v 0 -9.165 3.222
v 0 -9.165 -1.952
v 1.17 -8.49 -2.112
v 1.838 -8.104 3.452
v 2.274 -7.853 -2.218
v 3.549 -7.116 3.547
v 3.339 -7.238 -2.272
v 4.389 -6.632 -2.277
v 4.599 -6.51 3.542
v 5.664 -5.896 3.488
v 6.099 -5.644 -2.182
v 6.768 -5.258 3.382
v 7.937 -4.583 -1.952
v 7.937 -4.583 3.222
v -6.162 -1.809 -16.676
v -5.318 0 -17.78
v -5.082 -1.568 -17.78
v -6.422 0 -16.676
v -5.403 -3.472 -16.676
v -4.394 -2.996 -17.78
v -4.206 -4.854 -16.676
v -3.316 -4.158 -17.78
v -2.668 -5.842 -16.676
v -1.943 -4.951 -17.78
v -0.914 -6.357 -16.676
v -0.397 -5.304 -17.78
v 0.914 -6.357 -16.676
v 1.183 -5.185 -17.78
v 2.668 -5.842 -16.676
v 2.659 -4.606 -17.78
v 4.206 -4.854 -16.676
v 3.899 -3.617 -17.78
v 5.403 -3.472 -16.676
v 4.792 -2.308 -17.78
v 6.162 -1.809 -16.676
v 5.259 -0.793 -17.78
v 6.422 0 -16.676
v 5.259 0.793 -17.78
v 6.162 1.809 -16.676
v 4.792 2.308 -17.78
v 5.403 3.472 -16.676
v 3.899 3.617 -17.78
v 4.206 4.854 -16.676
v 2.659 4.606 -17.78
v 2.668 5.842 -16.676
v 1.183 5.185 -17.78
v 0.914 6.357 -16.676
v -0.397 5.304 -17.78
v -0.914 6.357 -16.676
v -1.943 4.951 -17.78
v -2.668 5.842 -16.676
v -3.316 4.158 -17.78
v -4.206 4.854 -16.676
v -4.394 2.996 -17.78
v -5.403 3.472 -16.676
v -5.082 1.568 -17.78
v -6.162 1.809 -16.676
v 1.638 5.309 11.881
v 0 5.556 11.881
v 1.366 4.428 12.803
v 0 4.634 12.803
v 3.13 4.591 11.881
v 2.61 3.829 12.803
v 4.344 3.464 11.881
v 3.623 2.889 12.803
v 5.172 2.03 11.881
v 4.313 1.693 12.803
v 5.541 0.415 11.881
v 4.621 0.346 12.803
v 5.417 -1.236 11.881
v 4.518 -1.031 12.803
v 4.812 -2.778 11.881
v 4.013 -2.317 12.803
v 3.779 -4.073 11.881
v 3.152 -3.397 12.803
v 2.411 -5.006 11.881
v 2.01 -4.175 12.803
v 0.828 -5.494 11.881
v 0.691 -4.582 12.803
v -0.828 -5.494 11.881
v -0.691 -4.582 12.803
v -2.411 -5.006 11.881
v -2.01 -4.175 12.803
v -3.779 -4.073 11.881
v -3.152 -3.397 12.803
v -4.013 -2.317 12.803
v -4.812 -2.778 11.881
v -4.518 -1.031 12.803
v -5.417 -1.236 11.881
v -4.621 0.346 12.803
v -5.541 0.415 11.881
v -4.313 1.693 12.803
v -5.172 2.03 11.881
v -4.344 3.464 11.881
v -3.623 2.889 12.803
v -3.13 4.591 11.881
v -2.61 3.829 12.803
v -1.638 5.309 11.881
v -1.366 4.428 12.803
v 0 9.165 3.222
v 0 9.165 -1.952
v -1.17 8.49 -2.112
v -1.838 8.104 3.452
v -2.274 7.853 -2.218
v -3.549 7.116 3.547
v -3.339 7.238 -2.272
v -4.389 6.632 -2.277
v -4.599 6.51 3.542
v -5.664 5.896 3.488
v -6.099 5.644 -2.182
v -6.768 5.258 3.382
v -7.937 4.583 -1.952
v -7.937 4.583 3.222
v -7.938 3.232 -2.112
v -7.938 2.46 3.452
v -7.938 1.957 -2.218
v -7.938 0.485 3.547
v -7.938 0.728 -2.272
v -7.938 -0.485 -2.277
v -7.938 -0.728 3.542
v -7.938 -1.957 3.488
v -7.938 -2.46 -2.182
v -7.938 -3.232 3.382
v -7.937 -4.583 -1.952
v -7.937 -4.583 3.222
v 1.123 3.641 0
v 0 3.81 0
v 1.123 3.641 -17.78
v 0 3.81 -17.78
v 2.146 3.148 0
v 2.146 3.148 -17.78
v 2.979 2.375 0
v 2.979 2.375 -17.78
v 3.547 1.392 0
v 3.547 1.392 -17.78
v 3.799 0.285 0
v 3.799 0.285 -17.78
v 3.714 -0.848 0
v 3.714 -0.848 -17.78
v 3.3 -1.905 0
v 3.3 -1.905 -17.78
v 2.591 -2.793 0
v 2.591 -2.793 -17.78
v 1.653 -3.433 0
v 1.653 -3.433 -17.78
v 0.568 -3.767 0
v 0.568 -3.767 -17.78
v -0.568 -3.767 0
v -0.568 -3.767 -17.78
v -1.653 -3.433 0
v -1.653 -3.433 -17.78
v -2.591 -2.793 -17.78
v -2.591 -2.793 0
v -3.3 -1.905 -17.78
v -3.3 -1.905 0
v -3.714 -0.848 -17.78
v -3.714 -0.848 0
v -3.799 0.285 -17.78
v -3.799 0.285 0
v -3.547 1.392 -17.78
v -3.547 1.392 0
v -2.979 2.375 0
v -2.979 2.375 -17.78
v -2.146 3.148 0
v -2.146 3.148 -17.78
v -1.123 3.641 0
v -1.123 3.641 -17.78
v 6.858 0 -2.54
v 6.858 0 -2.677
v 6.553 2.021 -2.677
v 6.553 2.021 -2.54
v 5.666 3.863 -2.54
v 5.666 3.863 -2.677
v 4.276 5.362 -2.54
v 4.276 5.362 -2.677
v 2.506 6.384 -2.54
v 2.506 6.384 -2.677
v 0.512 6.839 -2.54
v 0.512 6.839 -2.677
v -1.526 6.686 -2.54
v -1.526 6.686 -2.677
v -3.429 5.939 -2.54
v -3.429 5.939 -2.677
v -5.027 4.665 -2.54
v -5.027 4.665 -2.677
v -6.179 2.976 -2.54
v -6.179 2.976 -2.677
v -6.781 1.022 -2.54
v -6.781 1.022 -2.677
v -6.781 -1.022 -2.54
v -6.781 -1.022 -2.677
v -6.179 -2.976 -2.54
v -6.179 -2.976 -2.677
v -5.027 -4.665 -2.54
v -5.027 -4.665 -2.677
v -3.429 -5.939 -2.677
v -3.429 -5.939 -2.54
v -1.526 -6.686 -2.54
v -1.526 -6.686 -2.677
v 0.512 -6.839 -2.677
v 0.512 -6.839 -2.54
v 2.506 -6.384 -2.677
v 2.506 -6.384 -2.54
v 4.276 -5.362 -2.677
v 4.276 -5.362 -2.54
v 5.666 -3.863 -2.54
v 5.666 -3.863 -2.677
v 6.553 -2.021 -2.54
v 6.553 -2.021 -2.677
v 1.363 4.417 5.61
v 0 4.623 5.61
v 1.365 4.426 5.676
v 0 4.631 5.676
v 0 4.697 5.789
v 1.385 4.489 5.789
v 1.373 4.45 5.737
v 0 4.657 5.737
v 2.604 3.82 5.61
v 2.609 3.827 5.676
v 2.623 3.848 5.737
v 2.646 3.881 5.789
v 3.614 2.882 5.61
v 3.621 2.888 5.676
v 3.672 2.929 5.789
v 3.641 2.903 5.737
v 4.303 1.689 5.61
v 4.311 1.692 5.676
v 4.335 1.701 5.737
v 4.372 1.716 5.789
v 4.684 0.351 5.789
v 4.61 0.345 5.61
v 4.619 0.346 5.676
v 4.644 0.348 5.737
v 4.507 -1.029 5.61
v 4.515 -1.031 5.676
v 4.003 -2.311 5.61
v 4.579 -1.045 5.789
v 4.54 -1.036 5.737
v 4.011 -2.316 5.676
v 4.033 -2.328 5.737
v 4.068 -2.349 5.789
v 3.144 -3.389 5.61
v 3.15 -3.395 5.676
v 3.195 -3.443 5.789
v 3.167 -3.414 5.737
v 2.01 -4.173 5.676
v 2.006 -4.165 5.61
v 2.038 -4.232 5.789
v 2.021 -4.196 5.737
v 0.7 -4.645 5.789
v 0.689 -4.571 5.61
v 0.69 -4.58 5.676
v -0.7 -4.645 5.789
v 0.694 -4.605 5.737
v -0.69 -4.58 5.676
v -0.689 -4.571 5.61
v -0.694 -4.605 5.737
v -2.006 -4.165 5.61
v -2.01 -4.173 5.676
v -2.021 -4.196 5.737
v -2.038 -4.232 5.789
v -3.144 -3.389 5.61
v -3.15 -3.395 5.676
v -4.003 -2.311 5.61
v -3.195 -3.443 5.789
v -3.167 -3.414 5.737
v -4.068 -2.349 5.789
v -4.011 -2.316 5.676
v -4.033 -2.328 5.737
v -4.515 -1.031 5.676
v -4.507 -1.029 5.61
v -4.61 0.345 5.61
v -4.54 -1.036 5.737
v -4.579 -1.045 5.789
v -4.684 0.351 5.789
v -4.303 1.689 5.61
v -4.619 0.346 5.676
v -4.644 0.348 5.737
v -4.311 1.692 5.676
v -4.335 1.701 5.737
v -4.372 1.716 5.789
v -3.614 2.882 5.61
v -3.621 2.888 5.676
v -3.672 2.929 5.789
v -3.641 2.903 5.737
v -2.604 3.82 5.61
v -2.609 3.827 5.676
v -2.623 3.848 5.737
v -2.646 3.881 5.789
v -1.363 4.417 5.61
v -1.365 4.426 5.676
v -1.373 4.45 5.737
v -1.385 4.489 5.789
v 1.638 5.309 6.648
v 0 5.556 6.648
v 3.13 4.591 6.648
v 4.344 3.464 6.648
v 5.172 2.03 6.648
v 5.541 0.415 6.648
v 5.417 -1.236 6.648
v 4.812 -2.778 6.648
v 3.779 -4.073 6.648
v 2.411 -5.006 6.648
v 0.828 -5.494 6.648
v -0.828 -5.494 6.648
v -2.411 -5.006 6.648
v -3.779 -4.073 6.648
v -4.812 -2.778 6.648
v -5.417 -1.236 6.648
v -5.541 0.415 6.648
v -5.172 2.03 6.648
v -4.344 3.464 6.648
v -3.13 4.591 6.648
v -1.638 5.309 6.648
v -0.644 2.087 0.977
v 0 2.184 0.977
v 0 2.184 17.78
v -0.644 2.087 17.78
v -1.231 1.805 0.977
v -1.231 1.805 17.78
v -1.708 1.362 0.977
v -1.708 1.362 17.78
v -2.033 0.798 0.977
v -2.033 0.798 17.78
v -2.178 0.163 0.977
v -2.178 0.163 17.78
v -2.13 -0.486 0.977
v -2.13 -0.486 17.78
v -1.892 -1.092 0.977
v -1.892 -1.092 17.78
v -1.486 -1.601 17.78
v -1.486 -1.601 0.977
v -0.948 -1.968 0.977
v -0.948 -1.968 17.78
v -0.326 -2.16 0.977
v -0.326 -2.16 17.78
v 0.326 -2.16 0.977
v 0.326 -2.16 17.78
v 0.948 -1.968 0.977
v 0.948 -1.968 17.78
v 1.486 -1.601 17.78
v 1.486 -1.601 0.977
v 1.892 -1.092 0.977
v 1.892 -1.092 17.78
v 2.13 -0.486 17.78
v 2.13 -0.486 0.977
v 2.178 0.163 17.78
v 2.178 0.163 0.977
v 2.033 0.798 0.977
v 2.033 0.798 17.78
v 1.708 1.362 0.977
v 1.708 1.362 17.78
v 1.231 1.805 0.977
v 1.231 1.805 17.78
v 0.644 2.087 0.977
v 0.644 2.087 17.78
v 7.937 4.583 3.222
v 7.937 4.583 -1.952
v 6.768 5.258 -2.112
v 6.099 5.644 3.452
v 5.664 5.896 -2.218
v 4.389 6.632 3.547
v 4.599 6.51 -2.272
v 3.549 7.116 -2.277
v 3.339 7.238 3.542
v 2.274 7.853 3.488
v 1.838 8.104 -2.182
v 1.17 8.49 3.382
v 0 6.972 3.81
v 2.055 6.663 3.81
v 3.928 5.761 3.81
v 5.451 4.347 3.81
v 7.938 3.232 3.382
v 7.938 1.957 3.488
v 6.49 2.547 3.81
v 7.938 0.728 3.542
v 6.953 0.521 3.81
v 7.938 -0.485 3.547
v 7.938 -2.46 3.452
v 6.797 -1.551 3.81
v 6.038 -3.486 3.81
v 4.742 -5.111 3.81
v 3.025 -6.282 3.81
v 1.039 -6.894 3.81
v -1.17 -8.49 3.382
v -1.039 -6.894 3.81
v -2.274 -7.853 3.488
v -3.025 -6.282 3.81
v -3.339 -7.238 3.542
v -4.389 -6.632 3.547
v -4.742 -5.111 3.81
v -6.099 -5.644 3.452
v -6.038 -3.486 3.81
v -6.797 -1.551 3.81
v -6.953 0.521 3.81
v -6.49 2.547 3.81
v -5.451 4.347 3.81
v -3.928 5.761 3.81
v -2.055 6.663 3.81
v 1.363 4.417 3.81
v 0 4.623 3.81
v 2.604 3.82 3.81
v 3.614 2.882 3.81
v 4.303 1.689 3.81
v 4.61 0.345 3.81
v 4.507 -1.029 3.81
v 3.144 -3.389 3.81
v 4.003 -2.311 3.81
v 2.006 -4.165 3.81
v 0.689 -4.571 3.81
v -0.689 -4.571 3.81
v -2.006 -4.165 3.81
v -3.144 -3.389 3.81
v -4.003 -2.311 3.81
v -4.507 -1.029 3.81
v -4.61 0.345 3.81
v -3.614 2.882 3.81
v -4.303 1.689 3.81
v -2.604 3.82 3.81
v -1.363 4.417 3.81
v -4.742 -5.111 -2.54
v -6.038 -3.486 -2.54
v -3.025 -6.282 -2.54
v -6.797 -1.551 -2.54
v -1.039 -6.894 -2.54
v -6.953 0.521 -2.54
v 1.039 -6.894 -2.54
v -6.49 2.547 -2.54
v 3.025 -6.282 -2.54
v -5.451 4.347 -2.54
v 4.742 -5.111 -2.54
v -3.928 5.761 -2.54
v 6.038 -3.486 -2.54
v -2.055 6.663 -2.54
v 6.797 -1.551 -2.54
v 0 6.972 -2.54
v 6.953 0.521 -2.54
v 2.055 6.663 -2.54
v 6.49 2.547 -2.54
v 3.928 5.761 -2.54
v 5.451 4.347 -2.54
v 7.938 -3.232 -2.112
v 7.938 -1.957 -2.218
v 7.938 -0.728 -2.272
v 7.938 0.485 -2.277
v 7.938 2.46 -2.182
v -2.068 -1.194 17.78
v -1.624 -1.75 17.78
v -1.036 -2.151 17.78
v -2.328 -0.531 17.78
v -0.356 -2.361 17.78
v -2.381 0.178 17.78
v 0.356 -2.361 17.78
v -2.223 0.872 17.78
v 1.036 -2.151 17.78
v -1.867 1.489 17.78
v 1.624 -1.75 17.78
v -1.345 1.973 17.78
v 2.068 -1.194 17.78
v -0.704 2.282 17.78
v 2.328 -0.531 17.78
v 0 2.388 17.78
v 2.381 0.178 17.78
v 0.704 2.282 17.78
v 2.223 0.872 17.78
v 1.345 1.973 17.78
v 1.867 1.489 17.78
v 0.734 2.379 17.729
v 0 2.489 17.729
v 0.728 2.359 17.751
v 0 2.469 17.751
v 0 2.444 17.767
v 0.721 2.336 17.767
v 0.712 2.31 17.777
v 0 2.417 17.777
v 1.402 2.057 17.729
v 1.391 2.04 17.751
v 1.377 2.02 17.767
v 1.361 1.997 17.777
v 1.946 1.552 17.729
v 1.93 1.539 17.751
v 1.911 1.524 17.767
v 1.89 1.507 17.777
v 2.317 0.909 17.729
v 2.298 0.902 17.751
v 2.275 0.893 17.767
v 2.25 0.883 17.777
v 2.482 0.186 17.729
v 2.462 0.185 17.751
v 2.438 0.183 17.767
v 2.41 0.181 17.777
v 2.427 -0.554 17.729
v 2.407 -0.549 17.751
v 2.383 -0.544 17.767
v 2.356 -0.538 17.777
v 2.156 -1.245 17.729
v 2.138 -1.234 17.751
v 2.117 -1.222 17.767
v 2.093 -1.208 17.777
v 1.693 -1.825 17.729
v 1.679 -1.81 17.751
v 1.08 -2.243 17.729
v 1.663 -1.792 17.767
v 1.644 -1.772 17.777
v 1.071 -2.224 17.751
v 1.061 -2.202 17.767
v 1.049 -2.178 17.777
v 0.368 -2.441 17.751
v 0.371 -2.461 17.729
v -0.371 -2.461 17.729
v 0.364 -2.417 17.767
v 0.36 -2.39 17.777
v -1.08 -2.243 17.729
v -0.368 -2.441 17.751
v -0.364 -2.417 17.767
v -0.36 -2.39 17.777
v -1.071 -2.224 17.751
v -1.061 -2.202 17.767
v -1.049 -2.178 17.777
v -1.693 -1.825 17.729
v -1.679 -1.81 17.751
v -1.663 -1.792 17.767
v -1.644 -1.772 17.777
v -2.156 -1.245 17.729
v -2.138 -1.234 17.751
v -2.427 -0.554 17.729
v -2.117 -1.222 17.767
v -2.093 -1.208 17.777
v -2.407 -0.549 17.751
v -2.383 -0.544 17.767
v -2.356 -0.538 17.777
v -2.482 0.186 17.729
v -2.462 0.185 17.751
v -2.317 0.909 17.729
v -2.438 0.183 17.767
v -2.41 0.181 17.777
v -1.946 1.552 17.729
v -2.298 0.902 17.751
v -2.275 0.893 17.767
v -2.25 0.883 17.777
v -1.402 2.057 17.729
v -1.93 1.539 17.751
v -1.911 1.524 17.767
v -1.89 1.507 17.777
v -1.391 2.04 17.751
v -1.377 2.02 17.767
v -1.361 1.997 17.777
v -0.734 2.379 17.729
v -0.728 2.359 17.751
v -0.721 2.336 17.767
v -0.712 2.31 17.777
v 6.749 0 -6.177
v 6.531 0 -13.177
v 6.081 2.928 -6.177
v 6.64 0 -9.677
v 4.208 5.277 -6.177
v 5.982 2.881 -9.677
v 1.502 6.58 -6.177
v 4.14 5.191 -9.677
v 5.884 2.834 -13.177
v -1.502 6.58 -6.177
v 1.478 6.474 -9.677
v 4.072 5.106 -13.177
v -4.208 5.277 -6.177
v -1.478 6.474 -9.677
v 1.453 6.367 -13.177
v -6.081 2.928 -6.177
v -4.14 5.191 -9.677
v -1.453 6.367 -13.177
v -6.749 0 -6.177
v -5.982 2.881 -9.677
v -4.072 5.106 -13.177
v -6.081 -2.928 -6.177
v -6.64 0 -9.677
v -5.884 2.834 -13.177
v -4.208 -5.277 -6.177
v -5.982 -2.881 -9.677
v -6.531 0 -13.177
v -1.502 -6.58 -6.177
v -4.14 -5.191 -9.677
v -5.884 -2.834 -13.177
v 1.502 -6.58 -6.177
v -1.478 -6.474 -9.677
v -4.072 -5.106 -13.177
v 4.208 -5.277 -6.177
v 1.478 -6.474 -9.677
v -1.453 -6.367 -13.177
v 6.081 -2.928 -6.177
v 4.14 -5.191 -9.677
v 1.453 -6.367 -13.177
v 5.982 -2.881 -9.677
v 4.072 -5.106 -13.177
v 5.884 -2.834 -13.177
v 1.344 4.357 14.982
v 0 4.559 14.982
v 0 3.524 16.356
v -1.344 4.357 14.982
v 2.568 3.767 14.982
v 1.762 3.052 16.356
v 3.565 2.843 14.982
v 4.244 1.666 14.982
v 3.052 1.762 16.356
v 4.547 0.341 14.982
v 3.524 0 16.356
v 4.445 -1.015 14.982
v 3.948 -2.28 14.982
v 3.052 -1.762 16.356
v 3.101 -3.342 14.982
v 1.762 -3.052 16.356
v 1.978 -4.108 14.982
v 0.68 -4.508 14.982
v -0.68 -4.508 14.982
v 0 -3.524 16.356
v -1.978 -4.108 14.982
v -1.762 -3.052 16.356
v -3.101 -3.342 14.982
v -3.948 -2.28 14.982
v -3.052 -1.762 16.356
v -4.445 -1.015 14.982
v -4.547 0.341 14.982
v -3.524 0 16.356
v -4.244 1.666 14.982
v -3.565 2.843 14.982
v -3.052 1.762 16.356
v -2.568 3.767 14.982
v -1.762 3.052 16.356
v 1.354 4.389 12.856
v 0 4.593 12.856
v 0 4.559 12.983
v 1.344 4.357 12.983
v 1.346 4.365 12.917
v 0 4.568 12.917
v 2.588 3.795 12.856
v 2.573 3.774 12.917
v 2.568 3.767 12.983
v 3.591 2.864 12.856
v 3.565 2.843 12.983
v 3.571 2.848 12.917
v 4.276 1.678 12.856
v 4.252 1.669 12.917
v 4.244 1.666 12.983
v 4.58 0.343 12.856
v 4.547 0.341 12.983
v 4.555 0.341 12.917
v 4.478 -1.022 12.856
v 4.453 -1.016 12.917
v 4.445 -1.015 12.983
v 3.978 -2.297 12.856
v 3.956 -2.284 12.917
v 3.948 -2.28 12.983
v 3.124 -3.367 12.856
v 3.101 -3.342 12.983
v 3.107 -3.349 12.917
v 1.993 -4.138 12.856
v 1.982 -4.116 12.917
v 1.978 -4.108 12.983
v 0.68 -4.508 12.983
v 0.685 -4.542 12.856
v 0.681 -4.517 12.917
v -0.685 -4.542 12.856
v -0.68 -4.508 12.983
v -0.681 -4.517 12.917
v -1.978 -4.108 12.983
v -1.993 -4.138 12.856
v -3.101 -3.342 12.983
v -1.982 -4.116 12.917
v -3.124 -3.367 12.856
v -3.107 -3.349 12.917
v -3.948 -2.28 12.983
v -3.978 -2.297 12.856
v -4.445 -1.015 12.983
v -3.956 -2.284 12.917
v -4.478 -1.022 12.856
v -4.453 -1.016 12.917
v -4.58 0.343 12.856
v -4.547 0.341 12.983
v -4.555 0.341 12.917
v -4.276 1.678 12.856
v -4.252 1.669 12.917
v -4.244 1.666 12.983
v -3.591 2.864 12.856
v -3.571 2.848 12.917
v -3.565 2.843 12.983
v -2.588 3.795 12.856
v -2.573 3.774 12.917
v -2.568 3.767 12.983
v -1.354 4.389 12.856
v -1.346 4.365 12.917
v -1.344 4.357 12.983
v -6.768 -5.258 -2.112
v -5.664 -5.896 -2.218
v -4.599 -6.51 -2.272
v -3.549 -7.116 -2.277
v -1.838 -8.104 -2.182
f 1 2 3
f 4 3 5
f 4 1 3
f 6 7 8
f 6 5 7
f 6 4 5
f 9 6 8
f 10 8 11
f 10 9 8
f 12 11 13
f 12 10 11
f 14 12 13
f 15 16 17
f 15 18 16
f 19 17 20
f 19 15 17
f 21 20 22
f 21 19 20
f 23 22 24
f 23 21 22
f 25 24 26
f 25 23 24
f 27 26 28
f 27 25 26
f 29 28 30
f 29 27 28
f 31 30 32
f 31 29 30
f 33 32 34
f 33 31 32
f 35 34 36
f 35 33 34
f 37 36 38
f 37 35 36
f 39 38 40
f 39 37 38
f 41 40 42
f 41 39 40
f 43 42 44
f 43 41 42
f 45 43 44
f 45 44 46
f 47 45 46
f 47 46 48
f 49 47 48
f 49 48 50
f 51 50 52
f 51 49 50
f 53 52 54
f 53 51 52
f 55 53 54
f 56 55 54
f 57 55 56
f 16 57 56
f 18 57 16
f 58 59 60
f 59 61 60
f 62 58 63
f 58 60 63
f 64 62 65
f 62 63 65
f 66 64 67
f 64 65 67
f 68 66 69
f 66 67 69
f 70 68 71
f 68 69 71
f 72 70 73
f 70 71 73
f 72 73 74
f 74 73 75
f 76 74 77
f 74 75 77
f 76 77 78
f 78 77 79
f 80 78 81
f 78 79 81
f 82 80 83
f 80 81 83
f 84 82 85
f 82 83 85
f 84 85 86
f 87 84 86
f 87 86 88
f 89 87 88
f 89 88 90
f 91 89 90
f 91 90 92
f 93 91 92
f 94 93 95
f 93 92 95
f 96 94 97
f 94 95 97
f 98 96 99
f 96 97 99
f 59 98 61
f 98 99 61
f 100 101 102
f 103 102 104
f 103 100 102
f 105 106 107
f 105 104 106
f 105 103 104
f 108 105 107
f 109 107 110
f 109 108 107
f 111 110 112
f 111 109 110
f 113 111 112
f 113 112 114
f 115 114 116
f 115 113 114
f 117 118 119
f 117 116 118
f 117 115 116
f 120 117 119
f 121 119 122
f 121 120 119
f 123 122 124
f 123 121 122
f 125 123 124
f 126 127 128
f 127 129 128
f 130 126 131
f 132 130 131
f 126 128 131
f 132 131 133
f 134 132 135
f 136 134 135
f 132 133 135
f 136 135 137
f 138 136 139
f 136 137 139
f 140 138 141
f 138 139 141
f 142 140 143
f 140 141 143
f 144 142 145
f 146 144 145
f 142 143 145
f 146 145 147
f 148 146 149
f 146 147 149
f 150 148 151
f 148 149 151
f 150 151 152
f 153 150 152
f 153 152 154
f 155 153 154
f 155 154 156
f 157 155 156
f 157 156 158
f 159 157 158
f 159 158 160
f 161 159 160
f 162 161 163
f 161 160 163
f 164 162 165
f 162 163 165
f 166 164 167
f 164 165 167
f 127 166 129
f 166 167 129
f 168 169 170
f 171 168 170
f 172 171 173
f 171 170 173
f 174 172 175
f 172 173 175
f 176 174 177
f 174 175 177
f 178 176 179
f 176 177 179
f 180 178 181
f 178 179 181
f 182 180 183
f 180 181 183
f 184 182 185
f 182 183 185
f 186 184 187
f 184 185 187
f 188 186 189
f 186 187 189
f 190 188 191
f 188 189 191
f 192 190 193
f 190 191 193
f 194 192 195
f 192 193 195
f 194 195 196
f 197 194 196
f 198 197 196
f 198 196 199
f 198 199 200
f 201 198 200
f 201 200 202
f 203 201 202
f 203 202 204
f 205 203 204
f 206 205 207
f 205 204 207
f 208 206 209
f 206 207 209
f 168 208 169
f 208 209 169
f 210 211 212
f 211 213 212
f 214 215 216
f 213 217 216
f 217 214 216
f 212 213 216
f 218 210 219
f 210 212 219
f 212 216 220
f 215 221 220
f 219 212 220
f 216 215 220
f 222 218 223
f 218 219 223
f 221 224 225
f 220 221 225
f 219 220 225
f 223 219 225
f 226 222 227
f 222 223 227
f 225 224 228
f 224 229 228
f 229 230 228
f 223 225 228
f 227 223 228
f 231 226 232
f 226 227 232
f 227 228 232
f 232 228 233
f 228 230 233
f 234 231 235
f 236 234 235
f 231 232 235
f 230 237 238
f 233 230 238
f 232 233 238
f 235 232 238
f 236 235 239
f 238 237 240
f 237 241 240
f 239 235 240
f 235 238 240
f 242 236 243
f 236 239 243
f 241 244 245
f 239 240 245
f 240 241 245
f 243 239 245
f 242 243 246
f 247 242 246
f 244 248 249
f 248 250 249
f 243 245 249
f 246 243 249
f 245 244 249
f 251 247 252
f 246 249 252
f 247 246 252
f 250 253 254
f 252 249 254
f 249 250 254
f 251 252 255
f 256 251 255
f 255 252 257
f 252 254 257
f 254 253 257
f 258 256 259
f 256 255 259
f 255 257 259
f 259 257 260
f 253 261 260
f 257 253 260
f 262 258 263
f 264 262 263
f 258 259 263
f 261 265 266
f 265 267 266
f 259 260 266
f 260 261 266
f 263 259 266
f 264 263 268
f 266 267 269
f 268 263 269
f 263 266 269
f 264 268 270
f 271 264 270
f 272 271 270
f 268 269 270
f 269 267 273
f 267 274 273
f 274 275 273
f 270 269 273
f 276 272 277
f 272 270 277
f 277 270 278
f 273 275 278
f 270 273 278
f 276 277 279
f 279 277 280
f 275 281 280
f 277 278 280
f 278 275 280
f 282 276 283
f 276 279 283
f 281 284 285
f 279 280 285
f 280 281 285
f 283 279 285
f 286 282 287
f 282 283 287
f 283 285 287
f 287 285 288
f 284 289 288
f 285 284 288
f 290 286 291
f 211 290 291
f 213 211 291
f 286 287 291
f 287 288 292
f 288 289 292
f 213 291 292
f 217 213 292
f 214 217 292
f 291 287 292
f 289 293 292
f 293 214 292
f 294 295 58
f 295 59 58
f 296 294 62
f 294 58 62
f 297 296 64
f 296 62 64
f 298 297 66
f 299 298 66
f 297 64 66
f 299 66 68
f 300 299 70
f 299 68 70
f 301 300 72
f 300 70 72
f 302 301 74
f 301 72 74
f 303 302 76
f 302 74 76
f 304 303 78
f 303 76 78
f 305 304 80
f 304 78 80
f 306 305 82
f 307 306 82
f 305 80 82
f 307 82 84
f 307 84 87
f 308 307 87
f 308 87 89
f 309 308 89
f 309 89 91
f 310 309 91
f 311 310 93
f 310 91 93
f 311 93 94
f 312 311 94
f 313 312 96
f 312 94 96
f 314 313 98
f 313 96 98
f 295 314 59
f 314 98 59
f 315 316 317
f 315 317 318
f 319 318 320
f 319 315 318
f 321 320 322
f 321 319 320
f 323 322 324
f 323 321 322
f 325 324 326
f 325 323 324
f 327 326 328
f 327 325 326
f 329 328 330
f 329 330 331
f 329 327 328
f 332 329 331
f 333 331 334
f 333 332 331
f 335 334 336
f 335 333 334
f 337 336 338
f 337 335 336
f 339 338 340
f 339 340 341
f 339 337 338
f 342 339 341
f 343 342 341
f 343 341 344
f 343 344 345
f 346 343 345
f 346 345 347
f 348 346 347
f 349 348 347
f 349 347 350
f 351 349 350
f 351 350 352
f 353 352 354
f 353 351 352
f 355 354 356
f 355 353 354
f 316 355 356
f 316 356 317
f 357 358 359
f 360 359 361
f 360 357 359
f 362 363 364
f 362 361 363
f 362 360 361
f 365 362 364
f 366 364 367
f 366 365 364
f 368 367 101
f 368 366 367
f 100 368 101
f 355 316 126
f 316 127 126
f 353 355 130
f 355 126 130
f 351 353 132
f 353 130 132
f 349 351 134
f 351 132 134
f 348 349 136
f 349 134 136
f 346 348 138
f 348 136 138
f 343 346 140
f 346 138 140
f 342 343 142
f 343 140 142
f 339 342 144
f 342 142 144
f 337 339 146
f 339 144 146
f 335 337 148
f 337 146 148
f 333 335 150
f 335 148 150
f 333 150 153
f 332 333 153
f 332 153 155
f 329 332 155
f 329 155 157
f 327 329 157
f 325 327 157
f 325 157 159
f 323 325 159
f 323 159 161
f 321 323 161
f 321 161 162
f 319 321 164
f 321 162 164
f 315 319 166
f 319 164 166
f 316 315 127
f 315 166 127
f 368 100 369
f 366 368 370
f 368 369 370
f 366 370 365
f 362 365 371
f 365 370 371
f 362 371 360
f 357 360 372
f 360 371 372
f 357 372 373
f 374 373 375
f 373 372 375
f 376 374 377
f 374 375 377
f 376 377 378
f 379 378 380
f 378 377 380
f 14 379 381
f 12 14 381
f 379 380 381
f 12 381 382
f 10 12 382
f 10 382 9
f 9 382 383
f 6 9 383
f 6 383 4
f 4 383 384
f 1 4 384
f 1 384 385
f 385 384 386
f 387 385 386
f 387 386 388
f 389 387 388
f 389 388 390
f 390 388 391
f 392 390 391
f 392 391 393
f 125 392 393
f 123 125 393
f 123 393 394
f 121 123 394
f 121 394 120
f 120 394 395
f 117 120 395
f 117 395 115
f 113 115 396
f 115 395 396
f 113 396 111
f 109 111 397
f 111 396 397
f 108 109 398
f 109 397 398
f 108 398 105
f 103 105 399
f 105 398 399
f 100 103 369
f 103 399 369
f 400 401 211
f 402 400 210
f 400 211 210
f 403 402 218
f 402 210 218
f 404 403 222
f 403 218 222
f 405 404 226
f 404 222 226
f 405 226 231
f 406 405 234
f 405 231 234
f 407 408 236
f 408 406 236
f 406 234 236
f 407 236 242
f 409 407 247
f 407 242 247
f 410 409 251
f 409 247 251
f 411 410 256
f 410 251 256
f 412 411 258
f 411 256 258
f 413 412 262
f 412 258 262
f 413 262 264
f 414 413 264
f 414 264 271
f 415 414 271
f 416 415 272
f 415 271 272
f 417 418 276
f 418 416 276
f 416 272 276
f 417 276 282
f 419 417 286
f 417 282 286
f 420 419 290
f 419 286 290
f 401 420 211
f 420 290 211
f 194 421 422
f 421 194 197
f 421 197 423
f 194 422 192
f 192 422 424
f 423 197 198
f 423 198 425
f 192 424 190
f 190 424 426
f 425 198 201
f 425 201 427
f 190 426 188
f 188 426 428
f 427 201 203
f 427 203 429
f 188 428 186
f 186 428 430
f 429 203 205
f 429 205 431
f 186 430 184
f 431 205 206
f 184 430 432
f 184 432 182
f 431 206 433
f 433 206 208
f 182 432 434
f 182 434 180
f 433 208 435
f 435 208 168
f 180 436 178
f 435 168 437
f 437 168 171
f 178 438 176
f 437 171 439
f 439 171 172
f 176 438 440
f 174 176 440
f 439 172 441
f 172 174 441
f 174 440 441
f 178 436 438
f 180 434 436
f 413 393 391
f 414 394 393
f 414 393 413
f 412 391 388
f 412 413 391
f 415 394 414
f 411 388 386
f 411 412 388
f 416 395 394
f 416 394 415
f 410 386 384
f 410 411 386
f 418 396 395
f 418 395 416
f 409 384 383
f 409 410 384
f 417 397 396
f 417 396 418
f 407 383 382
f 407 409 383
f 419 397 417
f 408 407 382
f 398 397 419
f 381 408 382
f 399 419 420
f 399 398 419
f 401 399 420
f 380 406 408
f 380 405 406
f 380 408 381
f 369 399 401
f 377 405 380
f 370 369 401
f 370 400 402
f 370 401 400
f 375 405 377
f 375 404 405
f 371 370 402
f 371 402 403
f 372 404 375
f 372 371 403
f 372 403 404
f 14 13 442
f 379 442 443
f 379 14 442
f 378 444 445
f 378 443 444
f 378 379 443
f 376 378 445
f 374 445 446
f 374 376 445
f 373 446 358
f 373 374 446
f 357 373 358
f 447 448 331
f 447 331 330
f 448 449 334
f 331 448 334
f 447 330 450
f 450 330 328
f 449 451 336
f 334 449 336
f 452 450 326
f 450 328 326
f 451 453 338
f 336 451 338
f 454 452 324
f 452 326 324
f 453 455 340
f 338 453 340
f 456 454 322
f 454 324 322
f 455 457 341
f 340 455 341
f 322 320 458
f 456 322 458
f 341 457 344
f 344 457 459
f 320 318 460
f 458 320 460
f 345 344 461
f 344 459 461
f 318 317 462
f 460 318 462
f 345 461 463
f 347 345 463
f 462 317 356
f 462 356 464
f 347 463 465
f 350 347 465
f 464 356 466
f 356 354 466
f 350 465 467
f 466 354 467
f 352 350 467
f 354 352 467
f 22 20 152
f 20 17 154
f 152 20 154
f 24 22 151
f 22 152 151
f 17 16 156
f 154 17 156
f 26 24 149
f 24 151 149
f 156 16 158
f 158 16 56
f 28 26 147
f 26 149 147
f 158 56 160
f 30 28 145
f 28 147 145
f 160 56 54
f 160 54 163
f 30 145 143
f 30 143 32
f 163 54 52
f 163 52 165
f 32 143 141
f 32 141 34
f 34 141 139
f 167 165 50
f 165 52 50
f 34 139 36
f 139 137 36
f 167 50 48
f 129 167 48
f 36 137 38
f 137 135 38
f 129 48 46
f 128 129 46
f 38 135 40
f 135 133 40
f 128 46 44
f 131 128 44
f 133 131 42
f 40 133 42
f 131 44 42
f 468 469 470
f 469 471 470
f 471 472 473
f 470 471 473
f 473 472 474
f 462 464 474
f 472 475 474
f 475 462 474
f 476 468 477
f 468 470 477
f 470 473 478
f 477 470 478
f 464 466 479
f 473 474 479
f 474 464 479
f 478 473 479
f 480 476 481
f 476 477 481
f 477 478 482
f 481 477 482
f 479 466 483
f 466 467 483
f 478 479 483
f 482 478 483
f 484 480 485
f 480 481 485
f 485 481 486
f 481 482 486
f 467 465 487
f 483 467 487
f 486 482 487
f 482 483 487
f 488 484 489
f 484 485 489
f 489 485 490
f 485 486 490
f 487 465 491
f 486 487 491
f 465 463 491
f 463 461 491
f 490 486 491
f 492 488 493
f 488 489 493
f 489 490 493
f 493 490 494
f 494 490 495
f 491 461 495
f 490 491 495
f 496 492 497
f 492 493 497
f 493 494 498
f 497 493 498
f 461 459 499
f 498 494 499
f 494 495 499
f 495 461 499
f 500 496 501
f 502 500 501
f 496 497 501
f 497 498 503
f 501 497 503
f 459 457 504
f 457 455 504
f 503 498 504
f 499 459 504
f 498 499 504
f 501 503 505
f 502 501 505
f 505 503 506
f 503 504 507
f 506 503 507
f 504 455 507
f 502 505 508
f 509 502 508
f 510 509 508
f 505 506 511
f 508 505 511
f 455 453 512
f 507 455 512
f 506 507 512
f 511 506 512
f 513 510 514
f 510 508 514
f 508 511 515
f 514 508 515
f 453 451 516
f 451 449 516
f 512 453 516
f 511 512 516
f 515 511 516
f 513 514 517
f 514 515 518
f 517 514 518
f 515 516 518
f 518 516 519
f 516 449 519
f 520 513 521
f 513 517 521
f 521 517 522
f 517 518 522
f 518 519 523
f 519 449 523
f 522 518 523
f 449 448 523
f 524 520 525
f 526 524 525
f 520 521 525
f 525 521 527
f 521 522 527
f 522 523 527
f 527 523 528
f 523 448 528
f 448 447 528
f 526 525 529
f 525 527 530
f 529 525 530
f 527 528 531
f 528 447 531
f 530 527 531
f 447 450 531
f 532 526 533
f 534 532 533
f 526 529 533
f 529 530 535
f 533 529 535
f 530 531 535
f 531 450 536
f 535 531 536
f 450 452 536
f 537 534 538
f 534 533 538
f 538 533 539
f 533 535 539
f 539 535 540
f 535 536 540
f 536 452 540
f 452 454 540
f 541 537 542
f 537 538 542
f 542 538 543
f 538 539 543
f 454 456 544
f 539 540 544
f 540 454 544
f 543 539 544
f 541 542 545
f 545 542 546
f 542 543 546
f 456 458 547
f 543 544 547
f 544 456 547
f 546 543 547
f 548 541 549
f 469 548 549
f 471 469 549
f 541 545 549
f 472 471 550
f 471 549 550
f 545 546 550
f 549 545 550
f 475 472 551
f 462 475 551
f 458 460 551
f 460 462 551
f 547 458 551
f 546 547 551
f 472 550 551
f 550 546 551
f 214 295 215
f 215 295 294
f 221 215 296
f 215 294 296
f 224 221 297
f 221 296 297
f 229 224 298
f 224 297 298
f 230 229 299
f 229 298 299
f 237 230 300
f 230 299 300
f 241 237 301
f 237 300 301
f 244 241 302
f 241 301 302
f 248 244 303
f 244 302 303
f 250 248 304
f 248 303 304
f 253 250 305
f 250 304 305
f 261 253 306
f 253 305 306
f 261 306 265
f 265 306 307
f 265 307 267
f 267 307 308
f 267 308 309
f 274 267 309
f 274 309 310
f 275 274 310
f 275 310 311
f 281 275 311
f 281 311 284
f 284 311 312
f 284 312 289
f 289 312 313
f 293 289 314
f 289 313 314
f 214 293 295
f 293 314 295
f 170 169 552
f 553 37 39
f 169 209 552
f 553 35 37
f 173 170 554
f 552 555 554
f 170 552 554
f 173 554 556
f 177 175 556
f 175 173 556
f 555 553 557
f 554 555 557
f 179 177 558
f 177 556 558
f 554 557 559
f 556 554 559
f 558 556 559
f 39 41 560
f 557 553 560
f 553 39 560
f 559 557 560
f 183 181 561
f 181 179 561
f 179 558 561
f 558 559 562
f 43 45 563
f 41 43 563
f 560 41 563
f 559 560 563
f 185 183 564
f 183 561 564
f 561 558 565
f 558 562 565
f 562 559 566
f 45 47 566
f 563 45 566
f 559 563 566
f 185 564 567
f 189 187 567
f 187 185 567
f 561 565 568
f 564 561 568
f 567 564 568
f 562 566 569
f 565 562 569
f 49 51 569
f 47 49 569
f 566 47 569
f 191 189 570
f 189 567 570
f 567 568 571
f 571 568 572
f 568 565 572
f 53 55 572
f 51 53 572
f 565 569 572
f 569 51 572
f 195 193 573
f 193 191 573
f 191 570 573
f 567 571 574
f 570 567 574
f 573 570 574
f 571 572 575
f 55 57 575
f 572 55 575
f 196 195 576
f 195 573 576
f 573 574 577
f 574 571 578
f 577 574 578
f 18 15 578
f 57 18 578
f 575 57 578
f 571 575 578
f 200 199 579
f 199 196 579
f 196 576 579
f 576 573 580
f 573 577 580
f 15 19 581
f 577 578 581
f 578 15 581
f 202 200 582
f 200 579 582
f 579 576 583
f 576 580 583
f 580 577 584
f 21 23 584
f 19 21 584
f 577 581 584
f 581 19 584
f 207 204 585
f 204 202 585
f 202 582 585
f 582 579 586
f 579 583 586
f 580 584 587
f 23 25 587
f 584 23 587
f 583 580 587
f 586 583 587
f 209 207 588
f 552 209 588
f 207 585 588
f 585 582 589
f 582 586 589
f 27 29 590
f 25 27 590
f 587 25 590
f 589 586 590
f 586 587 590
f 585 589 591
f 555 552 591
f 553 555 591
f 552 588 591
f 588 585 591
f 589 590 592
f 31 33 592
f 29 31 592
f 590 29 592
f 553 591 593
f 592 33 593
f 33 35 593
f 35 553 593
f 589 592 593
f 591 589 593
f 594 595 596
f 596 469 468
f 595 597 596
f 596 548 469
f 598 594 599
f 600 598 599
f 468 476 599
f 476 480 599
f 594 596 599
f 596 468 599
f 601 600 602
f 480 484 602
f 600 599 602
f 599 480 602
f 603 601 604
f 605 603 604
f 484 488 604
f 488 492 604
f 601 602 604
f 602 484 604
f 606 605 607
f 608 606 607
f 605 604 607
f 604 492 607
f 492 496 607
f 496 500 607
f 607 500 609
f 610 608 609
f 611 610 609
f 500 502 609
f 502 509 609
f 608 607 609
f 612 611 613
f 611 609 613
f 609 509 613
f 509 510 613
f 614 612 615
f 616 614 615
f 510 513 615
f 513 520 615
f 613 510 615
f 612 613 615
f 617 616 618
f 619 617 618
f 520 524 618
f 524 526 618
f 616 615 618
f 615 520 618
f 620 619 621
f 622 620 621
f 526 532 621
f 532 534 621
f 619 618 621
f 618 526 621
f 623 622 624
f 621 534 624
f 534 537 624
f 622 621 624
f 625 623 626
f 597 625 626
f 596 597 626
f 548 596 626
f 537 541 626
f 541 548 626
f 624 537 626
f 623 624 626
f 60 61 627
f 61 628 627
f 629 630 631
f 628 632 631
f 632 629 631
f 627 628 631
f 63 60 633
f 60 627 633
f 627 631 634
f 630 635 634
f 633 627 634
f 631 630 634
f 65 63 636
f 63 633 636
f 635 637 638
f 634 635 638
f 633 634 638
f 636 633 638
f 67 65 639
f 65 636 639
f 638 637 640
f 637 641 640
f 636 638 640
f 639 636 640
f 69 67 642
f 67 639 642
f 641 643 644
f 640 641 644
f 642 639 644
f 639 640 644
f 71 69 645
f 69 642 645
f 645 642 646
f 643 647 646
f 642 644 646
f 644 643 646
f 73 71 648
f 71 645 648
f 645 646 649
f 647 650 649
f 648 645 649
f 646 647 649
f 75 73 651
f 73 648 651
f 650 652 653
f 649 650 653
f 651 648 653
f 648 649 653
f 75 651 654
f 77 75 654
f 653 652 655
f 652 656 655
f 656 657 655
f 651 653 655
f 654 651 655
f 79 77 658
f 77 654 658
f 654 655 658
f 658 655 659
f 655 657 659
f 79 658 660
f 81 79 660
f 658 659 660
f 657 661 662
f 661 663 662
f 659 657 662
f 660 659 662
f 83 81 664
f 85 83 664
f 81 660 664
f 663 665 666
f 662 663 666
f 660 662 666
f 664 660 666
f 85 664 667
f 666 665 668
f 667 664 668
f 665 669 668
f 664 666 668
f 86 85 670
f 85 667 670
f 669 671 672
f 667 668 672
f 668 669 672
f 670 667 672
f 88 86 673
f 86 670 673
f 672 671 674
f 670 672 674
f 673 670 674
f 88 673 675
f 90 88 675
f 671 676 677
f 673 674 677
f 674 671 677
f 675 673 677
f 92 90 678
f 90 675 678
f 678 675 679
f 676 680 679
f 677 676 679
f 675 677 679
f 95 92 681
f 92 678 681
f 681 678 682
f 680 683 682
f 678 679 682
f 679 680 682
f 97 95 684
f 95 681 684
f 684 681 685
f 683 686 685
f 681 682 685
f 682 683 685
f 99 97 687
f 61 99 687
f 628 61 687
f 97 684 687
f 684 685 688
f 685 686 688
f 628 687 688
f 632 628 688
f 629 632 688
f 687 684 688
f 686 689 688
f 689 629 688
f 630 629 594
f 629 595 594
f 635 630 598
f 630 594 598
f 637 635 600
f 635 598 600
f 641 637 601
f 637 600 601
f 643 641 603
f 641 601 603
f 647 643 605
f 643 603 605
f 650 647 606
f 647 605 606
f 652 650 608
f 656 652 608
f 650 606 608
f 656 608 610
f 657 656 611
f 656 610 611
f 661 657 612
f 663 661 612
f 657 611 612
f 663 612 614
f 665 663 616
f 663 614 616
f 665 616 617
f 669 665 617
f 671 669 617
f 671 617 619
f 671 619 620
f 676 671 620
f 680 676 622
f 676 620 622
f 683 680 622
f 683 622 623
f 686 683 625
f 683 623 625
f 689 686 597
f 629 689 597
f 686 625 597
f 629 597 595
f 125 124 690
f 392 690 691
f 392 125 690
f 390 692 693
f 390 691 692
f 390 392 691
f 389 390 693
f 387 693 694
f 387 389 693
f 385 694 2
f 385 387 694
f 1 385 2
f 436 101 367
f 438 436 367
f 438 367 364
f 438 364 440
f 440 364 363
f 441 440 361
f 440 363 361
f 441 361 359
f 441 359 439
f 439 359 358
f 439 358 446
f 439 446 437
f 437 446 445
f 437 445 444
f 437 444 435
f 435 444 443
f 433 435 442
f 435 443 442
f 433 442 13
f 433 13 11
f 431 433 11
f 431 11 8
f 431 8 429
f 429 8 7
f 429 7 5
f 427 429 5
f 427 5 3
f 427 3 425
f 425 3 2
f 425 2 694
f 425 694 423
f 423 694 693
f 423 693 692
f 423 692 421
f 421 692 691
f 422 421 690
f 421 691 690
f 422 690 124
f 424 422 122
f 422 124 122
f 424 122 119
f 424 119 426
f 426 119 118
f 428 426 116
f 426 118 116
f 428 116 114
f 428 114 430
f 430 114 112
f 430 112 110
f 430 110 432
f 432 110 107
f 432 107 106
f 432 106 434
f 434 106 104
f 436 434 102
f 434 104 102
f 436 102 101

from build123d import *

# Parameters (mm, degrees)
BOSS_EXTRUDE1_DEPTH      = 3.81
BOSS_EXTRUDE1_DEPTH_BACK = 2.54
SKETCH6_R                = 6.858
BOSS_EXTRUDE2_DEPTH      = 15.10284
BOSS_EXTRUDE2_TAPER      = 1.783333333
SKETCH9_OUTSIDE_W        = 56.69
SKETCH9_OUTSIDE_H        = 59.144
SKETCH9_OUTSIDE_R        = 5.318470858
CUT_EXTRUDE1_DEPTH       = 15.10284
CUT_EXTRUDE1_TAPER       = 45
SKETCH10_R               = 6.858
BOSS_EXTRUDE3_DEPTH      = 0.13716
SKETCH11_W               = 35.56
SKETCH11_H               = 2.1844


with BuildPart() as part:
    # Sketch1 → Revolve1 (revolve)
    with BuildSketch(Plane(origin=(0, 0, 0), x_dir=(0, 0, -1), z_dir=(1, 0, 0))):
        with BuildLine():
            Line((-17.78, 0), (0, 0))
            Line((0, 0), (0, 4.6228))
            Line((0, 4.6228), (-5.609789755, 4.6228))
            ThreePointArc((-5.609789755, 4.6228), (-5.706991347, 4.642134599), (-5.789394878, 4.697194878))
            Line((-5.789394878, 4.697194878), (-6.64845, 5.55625))
            Line((-6.64845, 5.55625), (-11.88085, 5.55625))
            Line((-11.88085, 5.55625), (-12.803405122, 4.633694878))
            ThreePointArc((-12.803405122, 4.633694878), (-12.885808653, 4.578634599), (-12.983010245, 4.5593))
            Line((-12.983010245, 4.5593), (-14.982324107, 4.5593))
            Line((-14.982324107, 4.5593), (-17.729430508, 2.489206846))
            ThreePointArc((-17.729430508, 2.489206846), (-17.766656664, 2.444447258), (-17.78, 2.387780136))
            Line((-17.78, 2.387780136), (-17.78, 0))
        make_face()
    revolve(axis=Axis((0, 0, 19.812), (0, 0, -1)))

    # Sketch4 → Boss-Extrude1 (add, two sides)
    with BuildSketch(Plane.XY) as boss_extrude1_sk:
        Polygon((0, 9.165435523), (-7.9375, 4.582717762), (-7.9375, -4.582717762), (0, -9.165435523), (7.9375, -4.582717762), (7.9375, 4.582717762), align=None)
    extrude(amount=BOSS_EXTRUDE1_DEPTH)
    extrude(boss_extrude1_sk.sketch, amount=-BOSS_EXTRUDE1_DEPTH_BACK)

    # Sketch5 → Cut-Revolve1 (revolve, cut)
    with BuildSketch(Plane(origin=(0, 0, 0), x_dir=(0, 0, -1), z_dir=(1, 0, 0))):
        Polygon((-3.81, 11.358571047), (2.54, 11.358571047), (2.54, 6.9723), (1.952351108, 9.165435523), (-3.222351108, 9.165435523), (-3.81, 6.9723), align=None)
    revolve(axis=Axis((0, 0, 3.81), (0, 0, -1)), mode=Mode.SUBTRACT)



with BuildPart() as body_2:
    # Sketch6 → Boss-Extrude2 (new body)
    with BuildSketch(Plane.XY.offset(-2.67716)):
        Circle(SKETCH6_R)
    extrude(amount=-BOSS_EXTRUDE2_DEPTH, taper=BOSS_EXTRUDE2_TAPER)

    # Sketch9 outside → Cut-Extrude1 (cut)
    with BuildSketch(Plane(origin=(0, 0, -17.78), x_dir=(-1, 0, 0), z_dir=(0, 0, -1))):
        Rectangle(SKETCH9_OUTSIDE_W, SKETCH9_OUTSIDE_H)
        Circle(SKETCH9_OUTSIDE_R, mode=Mode.SUBTRACT)
    extrude(amount=-CUT_EXTRUDE1_DEPTH, taper=CUT_EXTRUDE1_TAPER, mode=Mode.SUBTRACT)


with BuildPart() as part_1:
    add(part.part)

    add(body_2.part)  # Boss-Extrude3 merges body 2
    # Sketch10 → Boss-Extrude3 (add)
    with BuildSketch(Plane.XY.offset(-2.67716)):
        Circle(SKETCH10_R)
    extrude(amount=BOSS_EXTRUDE3_DEPTH)

    # Sketch11 → Cut-Revolve2 (revolve, cut)
    with BuildSketch(Plane(origin=(0, 0, 0), x_dir=(0, 0, -1), z_dir=(1, 0, 0))):
        with Locations((0, 1.0922)):
            Rectangle(SKETCH11_W, SKETCH11_H)
    revolve(axis=Axis((0, 0, -17.78), (0, 0, 1)), mode=Mode.SUBTRACT)

    # Sketch12 → Cut-Revolve3 (revolve, cut)
    with BuildSketch(Plane(origin=(0, 0, 0), x_dir=(0, 0, -1), z_dir=(1, 0, 0))):
        Polygon((17.78, 0), (-2.289278958, 0), (0, 3.81), (17.78, 3.81), align=None)
    revolve(axis=Axis((0, 0, 17.78), (0, 0, -1)), mode=Mode.SUBTRACT)


solid = part_1.part
